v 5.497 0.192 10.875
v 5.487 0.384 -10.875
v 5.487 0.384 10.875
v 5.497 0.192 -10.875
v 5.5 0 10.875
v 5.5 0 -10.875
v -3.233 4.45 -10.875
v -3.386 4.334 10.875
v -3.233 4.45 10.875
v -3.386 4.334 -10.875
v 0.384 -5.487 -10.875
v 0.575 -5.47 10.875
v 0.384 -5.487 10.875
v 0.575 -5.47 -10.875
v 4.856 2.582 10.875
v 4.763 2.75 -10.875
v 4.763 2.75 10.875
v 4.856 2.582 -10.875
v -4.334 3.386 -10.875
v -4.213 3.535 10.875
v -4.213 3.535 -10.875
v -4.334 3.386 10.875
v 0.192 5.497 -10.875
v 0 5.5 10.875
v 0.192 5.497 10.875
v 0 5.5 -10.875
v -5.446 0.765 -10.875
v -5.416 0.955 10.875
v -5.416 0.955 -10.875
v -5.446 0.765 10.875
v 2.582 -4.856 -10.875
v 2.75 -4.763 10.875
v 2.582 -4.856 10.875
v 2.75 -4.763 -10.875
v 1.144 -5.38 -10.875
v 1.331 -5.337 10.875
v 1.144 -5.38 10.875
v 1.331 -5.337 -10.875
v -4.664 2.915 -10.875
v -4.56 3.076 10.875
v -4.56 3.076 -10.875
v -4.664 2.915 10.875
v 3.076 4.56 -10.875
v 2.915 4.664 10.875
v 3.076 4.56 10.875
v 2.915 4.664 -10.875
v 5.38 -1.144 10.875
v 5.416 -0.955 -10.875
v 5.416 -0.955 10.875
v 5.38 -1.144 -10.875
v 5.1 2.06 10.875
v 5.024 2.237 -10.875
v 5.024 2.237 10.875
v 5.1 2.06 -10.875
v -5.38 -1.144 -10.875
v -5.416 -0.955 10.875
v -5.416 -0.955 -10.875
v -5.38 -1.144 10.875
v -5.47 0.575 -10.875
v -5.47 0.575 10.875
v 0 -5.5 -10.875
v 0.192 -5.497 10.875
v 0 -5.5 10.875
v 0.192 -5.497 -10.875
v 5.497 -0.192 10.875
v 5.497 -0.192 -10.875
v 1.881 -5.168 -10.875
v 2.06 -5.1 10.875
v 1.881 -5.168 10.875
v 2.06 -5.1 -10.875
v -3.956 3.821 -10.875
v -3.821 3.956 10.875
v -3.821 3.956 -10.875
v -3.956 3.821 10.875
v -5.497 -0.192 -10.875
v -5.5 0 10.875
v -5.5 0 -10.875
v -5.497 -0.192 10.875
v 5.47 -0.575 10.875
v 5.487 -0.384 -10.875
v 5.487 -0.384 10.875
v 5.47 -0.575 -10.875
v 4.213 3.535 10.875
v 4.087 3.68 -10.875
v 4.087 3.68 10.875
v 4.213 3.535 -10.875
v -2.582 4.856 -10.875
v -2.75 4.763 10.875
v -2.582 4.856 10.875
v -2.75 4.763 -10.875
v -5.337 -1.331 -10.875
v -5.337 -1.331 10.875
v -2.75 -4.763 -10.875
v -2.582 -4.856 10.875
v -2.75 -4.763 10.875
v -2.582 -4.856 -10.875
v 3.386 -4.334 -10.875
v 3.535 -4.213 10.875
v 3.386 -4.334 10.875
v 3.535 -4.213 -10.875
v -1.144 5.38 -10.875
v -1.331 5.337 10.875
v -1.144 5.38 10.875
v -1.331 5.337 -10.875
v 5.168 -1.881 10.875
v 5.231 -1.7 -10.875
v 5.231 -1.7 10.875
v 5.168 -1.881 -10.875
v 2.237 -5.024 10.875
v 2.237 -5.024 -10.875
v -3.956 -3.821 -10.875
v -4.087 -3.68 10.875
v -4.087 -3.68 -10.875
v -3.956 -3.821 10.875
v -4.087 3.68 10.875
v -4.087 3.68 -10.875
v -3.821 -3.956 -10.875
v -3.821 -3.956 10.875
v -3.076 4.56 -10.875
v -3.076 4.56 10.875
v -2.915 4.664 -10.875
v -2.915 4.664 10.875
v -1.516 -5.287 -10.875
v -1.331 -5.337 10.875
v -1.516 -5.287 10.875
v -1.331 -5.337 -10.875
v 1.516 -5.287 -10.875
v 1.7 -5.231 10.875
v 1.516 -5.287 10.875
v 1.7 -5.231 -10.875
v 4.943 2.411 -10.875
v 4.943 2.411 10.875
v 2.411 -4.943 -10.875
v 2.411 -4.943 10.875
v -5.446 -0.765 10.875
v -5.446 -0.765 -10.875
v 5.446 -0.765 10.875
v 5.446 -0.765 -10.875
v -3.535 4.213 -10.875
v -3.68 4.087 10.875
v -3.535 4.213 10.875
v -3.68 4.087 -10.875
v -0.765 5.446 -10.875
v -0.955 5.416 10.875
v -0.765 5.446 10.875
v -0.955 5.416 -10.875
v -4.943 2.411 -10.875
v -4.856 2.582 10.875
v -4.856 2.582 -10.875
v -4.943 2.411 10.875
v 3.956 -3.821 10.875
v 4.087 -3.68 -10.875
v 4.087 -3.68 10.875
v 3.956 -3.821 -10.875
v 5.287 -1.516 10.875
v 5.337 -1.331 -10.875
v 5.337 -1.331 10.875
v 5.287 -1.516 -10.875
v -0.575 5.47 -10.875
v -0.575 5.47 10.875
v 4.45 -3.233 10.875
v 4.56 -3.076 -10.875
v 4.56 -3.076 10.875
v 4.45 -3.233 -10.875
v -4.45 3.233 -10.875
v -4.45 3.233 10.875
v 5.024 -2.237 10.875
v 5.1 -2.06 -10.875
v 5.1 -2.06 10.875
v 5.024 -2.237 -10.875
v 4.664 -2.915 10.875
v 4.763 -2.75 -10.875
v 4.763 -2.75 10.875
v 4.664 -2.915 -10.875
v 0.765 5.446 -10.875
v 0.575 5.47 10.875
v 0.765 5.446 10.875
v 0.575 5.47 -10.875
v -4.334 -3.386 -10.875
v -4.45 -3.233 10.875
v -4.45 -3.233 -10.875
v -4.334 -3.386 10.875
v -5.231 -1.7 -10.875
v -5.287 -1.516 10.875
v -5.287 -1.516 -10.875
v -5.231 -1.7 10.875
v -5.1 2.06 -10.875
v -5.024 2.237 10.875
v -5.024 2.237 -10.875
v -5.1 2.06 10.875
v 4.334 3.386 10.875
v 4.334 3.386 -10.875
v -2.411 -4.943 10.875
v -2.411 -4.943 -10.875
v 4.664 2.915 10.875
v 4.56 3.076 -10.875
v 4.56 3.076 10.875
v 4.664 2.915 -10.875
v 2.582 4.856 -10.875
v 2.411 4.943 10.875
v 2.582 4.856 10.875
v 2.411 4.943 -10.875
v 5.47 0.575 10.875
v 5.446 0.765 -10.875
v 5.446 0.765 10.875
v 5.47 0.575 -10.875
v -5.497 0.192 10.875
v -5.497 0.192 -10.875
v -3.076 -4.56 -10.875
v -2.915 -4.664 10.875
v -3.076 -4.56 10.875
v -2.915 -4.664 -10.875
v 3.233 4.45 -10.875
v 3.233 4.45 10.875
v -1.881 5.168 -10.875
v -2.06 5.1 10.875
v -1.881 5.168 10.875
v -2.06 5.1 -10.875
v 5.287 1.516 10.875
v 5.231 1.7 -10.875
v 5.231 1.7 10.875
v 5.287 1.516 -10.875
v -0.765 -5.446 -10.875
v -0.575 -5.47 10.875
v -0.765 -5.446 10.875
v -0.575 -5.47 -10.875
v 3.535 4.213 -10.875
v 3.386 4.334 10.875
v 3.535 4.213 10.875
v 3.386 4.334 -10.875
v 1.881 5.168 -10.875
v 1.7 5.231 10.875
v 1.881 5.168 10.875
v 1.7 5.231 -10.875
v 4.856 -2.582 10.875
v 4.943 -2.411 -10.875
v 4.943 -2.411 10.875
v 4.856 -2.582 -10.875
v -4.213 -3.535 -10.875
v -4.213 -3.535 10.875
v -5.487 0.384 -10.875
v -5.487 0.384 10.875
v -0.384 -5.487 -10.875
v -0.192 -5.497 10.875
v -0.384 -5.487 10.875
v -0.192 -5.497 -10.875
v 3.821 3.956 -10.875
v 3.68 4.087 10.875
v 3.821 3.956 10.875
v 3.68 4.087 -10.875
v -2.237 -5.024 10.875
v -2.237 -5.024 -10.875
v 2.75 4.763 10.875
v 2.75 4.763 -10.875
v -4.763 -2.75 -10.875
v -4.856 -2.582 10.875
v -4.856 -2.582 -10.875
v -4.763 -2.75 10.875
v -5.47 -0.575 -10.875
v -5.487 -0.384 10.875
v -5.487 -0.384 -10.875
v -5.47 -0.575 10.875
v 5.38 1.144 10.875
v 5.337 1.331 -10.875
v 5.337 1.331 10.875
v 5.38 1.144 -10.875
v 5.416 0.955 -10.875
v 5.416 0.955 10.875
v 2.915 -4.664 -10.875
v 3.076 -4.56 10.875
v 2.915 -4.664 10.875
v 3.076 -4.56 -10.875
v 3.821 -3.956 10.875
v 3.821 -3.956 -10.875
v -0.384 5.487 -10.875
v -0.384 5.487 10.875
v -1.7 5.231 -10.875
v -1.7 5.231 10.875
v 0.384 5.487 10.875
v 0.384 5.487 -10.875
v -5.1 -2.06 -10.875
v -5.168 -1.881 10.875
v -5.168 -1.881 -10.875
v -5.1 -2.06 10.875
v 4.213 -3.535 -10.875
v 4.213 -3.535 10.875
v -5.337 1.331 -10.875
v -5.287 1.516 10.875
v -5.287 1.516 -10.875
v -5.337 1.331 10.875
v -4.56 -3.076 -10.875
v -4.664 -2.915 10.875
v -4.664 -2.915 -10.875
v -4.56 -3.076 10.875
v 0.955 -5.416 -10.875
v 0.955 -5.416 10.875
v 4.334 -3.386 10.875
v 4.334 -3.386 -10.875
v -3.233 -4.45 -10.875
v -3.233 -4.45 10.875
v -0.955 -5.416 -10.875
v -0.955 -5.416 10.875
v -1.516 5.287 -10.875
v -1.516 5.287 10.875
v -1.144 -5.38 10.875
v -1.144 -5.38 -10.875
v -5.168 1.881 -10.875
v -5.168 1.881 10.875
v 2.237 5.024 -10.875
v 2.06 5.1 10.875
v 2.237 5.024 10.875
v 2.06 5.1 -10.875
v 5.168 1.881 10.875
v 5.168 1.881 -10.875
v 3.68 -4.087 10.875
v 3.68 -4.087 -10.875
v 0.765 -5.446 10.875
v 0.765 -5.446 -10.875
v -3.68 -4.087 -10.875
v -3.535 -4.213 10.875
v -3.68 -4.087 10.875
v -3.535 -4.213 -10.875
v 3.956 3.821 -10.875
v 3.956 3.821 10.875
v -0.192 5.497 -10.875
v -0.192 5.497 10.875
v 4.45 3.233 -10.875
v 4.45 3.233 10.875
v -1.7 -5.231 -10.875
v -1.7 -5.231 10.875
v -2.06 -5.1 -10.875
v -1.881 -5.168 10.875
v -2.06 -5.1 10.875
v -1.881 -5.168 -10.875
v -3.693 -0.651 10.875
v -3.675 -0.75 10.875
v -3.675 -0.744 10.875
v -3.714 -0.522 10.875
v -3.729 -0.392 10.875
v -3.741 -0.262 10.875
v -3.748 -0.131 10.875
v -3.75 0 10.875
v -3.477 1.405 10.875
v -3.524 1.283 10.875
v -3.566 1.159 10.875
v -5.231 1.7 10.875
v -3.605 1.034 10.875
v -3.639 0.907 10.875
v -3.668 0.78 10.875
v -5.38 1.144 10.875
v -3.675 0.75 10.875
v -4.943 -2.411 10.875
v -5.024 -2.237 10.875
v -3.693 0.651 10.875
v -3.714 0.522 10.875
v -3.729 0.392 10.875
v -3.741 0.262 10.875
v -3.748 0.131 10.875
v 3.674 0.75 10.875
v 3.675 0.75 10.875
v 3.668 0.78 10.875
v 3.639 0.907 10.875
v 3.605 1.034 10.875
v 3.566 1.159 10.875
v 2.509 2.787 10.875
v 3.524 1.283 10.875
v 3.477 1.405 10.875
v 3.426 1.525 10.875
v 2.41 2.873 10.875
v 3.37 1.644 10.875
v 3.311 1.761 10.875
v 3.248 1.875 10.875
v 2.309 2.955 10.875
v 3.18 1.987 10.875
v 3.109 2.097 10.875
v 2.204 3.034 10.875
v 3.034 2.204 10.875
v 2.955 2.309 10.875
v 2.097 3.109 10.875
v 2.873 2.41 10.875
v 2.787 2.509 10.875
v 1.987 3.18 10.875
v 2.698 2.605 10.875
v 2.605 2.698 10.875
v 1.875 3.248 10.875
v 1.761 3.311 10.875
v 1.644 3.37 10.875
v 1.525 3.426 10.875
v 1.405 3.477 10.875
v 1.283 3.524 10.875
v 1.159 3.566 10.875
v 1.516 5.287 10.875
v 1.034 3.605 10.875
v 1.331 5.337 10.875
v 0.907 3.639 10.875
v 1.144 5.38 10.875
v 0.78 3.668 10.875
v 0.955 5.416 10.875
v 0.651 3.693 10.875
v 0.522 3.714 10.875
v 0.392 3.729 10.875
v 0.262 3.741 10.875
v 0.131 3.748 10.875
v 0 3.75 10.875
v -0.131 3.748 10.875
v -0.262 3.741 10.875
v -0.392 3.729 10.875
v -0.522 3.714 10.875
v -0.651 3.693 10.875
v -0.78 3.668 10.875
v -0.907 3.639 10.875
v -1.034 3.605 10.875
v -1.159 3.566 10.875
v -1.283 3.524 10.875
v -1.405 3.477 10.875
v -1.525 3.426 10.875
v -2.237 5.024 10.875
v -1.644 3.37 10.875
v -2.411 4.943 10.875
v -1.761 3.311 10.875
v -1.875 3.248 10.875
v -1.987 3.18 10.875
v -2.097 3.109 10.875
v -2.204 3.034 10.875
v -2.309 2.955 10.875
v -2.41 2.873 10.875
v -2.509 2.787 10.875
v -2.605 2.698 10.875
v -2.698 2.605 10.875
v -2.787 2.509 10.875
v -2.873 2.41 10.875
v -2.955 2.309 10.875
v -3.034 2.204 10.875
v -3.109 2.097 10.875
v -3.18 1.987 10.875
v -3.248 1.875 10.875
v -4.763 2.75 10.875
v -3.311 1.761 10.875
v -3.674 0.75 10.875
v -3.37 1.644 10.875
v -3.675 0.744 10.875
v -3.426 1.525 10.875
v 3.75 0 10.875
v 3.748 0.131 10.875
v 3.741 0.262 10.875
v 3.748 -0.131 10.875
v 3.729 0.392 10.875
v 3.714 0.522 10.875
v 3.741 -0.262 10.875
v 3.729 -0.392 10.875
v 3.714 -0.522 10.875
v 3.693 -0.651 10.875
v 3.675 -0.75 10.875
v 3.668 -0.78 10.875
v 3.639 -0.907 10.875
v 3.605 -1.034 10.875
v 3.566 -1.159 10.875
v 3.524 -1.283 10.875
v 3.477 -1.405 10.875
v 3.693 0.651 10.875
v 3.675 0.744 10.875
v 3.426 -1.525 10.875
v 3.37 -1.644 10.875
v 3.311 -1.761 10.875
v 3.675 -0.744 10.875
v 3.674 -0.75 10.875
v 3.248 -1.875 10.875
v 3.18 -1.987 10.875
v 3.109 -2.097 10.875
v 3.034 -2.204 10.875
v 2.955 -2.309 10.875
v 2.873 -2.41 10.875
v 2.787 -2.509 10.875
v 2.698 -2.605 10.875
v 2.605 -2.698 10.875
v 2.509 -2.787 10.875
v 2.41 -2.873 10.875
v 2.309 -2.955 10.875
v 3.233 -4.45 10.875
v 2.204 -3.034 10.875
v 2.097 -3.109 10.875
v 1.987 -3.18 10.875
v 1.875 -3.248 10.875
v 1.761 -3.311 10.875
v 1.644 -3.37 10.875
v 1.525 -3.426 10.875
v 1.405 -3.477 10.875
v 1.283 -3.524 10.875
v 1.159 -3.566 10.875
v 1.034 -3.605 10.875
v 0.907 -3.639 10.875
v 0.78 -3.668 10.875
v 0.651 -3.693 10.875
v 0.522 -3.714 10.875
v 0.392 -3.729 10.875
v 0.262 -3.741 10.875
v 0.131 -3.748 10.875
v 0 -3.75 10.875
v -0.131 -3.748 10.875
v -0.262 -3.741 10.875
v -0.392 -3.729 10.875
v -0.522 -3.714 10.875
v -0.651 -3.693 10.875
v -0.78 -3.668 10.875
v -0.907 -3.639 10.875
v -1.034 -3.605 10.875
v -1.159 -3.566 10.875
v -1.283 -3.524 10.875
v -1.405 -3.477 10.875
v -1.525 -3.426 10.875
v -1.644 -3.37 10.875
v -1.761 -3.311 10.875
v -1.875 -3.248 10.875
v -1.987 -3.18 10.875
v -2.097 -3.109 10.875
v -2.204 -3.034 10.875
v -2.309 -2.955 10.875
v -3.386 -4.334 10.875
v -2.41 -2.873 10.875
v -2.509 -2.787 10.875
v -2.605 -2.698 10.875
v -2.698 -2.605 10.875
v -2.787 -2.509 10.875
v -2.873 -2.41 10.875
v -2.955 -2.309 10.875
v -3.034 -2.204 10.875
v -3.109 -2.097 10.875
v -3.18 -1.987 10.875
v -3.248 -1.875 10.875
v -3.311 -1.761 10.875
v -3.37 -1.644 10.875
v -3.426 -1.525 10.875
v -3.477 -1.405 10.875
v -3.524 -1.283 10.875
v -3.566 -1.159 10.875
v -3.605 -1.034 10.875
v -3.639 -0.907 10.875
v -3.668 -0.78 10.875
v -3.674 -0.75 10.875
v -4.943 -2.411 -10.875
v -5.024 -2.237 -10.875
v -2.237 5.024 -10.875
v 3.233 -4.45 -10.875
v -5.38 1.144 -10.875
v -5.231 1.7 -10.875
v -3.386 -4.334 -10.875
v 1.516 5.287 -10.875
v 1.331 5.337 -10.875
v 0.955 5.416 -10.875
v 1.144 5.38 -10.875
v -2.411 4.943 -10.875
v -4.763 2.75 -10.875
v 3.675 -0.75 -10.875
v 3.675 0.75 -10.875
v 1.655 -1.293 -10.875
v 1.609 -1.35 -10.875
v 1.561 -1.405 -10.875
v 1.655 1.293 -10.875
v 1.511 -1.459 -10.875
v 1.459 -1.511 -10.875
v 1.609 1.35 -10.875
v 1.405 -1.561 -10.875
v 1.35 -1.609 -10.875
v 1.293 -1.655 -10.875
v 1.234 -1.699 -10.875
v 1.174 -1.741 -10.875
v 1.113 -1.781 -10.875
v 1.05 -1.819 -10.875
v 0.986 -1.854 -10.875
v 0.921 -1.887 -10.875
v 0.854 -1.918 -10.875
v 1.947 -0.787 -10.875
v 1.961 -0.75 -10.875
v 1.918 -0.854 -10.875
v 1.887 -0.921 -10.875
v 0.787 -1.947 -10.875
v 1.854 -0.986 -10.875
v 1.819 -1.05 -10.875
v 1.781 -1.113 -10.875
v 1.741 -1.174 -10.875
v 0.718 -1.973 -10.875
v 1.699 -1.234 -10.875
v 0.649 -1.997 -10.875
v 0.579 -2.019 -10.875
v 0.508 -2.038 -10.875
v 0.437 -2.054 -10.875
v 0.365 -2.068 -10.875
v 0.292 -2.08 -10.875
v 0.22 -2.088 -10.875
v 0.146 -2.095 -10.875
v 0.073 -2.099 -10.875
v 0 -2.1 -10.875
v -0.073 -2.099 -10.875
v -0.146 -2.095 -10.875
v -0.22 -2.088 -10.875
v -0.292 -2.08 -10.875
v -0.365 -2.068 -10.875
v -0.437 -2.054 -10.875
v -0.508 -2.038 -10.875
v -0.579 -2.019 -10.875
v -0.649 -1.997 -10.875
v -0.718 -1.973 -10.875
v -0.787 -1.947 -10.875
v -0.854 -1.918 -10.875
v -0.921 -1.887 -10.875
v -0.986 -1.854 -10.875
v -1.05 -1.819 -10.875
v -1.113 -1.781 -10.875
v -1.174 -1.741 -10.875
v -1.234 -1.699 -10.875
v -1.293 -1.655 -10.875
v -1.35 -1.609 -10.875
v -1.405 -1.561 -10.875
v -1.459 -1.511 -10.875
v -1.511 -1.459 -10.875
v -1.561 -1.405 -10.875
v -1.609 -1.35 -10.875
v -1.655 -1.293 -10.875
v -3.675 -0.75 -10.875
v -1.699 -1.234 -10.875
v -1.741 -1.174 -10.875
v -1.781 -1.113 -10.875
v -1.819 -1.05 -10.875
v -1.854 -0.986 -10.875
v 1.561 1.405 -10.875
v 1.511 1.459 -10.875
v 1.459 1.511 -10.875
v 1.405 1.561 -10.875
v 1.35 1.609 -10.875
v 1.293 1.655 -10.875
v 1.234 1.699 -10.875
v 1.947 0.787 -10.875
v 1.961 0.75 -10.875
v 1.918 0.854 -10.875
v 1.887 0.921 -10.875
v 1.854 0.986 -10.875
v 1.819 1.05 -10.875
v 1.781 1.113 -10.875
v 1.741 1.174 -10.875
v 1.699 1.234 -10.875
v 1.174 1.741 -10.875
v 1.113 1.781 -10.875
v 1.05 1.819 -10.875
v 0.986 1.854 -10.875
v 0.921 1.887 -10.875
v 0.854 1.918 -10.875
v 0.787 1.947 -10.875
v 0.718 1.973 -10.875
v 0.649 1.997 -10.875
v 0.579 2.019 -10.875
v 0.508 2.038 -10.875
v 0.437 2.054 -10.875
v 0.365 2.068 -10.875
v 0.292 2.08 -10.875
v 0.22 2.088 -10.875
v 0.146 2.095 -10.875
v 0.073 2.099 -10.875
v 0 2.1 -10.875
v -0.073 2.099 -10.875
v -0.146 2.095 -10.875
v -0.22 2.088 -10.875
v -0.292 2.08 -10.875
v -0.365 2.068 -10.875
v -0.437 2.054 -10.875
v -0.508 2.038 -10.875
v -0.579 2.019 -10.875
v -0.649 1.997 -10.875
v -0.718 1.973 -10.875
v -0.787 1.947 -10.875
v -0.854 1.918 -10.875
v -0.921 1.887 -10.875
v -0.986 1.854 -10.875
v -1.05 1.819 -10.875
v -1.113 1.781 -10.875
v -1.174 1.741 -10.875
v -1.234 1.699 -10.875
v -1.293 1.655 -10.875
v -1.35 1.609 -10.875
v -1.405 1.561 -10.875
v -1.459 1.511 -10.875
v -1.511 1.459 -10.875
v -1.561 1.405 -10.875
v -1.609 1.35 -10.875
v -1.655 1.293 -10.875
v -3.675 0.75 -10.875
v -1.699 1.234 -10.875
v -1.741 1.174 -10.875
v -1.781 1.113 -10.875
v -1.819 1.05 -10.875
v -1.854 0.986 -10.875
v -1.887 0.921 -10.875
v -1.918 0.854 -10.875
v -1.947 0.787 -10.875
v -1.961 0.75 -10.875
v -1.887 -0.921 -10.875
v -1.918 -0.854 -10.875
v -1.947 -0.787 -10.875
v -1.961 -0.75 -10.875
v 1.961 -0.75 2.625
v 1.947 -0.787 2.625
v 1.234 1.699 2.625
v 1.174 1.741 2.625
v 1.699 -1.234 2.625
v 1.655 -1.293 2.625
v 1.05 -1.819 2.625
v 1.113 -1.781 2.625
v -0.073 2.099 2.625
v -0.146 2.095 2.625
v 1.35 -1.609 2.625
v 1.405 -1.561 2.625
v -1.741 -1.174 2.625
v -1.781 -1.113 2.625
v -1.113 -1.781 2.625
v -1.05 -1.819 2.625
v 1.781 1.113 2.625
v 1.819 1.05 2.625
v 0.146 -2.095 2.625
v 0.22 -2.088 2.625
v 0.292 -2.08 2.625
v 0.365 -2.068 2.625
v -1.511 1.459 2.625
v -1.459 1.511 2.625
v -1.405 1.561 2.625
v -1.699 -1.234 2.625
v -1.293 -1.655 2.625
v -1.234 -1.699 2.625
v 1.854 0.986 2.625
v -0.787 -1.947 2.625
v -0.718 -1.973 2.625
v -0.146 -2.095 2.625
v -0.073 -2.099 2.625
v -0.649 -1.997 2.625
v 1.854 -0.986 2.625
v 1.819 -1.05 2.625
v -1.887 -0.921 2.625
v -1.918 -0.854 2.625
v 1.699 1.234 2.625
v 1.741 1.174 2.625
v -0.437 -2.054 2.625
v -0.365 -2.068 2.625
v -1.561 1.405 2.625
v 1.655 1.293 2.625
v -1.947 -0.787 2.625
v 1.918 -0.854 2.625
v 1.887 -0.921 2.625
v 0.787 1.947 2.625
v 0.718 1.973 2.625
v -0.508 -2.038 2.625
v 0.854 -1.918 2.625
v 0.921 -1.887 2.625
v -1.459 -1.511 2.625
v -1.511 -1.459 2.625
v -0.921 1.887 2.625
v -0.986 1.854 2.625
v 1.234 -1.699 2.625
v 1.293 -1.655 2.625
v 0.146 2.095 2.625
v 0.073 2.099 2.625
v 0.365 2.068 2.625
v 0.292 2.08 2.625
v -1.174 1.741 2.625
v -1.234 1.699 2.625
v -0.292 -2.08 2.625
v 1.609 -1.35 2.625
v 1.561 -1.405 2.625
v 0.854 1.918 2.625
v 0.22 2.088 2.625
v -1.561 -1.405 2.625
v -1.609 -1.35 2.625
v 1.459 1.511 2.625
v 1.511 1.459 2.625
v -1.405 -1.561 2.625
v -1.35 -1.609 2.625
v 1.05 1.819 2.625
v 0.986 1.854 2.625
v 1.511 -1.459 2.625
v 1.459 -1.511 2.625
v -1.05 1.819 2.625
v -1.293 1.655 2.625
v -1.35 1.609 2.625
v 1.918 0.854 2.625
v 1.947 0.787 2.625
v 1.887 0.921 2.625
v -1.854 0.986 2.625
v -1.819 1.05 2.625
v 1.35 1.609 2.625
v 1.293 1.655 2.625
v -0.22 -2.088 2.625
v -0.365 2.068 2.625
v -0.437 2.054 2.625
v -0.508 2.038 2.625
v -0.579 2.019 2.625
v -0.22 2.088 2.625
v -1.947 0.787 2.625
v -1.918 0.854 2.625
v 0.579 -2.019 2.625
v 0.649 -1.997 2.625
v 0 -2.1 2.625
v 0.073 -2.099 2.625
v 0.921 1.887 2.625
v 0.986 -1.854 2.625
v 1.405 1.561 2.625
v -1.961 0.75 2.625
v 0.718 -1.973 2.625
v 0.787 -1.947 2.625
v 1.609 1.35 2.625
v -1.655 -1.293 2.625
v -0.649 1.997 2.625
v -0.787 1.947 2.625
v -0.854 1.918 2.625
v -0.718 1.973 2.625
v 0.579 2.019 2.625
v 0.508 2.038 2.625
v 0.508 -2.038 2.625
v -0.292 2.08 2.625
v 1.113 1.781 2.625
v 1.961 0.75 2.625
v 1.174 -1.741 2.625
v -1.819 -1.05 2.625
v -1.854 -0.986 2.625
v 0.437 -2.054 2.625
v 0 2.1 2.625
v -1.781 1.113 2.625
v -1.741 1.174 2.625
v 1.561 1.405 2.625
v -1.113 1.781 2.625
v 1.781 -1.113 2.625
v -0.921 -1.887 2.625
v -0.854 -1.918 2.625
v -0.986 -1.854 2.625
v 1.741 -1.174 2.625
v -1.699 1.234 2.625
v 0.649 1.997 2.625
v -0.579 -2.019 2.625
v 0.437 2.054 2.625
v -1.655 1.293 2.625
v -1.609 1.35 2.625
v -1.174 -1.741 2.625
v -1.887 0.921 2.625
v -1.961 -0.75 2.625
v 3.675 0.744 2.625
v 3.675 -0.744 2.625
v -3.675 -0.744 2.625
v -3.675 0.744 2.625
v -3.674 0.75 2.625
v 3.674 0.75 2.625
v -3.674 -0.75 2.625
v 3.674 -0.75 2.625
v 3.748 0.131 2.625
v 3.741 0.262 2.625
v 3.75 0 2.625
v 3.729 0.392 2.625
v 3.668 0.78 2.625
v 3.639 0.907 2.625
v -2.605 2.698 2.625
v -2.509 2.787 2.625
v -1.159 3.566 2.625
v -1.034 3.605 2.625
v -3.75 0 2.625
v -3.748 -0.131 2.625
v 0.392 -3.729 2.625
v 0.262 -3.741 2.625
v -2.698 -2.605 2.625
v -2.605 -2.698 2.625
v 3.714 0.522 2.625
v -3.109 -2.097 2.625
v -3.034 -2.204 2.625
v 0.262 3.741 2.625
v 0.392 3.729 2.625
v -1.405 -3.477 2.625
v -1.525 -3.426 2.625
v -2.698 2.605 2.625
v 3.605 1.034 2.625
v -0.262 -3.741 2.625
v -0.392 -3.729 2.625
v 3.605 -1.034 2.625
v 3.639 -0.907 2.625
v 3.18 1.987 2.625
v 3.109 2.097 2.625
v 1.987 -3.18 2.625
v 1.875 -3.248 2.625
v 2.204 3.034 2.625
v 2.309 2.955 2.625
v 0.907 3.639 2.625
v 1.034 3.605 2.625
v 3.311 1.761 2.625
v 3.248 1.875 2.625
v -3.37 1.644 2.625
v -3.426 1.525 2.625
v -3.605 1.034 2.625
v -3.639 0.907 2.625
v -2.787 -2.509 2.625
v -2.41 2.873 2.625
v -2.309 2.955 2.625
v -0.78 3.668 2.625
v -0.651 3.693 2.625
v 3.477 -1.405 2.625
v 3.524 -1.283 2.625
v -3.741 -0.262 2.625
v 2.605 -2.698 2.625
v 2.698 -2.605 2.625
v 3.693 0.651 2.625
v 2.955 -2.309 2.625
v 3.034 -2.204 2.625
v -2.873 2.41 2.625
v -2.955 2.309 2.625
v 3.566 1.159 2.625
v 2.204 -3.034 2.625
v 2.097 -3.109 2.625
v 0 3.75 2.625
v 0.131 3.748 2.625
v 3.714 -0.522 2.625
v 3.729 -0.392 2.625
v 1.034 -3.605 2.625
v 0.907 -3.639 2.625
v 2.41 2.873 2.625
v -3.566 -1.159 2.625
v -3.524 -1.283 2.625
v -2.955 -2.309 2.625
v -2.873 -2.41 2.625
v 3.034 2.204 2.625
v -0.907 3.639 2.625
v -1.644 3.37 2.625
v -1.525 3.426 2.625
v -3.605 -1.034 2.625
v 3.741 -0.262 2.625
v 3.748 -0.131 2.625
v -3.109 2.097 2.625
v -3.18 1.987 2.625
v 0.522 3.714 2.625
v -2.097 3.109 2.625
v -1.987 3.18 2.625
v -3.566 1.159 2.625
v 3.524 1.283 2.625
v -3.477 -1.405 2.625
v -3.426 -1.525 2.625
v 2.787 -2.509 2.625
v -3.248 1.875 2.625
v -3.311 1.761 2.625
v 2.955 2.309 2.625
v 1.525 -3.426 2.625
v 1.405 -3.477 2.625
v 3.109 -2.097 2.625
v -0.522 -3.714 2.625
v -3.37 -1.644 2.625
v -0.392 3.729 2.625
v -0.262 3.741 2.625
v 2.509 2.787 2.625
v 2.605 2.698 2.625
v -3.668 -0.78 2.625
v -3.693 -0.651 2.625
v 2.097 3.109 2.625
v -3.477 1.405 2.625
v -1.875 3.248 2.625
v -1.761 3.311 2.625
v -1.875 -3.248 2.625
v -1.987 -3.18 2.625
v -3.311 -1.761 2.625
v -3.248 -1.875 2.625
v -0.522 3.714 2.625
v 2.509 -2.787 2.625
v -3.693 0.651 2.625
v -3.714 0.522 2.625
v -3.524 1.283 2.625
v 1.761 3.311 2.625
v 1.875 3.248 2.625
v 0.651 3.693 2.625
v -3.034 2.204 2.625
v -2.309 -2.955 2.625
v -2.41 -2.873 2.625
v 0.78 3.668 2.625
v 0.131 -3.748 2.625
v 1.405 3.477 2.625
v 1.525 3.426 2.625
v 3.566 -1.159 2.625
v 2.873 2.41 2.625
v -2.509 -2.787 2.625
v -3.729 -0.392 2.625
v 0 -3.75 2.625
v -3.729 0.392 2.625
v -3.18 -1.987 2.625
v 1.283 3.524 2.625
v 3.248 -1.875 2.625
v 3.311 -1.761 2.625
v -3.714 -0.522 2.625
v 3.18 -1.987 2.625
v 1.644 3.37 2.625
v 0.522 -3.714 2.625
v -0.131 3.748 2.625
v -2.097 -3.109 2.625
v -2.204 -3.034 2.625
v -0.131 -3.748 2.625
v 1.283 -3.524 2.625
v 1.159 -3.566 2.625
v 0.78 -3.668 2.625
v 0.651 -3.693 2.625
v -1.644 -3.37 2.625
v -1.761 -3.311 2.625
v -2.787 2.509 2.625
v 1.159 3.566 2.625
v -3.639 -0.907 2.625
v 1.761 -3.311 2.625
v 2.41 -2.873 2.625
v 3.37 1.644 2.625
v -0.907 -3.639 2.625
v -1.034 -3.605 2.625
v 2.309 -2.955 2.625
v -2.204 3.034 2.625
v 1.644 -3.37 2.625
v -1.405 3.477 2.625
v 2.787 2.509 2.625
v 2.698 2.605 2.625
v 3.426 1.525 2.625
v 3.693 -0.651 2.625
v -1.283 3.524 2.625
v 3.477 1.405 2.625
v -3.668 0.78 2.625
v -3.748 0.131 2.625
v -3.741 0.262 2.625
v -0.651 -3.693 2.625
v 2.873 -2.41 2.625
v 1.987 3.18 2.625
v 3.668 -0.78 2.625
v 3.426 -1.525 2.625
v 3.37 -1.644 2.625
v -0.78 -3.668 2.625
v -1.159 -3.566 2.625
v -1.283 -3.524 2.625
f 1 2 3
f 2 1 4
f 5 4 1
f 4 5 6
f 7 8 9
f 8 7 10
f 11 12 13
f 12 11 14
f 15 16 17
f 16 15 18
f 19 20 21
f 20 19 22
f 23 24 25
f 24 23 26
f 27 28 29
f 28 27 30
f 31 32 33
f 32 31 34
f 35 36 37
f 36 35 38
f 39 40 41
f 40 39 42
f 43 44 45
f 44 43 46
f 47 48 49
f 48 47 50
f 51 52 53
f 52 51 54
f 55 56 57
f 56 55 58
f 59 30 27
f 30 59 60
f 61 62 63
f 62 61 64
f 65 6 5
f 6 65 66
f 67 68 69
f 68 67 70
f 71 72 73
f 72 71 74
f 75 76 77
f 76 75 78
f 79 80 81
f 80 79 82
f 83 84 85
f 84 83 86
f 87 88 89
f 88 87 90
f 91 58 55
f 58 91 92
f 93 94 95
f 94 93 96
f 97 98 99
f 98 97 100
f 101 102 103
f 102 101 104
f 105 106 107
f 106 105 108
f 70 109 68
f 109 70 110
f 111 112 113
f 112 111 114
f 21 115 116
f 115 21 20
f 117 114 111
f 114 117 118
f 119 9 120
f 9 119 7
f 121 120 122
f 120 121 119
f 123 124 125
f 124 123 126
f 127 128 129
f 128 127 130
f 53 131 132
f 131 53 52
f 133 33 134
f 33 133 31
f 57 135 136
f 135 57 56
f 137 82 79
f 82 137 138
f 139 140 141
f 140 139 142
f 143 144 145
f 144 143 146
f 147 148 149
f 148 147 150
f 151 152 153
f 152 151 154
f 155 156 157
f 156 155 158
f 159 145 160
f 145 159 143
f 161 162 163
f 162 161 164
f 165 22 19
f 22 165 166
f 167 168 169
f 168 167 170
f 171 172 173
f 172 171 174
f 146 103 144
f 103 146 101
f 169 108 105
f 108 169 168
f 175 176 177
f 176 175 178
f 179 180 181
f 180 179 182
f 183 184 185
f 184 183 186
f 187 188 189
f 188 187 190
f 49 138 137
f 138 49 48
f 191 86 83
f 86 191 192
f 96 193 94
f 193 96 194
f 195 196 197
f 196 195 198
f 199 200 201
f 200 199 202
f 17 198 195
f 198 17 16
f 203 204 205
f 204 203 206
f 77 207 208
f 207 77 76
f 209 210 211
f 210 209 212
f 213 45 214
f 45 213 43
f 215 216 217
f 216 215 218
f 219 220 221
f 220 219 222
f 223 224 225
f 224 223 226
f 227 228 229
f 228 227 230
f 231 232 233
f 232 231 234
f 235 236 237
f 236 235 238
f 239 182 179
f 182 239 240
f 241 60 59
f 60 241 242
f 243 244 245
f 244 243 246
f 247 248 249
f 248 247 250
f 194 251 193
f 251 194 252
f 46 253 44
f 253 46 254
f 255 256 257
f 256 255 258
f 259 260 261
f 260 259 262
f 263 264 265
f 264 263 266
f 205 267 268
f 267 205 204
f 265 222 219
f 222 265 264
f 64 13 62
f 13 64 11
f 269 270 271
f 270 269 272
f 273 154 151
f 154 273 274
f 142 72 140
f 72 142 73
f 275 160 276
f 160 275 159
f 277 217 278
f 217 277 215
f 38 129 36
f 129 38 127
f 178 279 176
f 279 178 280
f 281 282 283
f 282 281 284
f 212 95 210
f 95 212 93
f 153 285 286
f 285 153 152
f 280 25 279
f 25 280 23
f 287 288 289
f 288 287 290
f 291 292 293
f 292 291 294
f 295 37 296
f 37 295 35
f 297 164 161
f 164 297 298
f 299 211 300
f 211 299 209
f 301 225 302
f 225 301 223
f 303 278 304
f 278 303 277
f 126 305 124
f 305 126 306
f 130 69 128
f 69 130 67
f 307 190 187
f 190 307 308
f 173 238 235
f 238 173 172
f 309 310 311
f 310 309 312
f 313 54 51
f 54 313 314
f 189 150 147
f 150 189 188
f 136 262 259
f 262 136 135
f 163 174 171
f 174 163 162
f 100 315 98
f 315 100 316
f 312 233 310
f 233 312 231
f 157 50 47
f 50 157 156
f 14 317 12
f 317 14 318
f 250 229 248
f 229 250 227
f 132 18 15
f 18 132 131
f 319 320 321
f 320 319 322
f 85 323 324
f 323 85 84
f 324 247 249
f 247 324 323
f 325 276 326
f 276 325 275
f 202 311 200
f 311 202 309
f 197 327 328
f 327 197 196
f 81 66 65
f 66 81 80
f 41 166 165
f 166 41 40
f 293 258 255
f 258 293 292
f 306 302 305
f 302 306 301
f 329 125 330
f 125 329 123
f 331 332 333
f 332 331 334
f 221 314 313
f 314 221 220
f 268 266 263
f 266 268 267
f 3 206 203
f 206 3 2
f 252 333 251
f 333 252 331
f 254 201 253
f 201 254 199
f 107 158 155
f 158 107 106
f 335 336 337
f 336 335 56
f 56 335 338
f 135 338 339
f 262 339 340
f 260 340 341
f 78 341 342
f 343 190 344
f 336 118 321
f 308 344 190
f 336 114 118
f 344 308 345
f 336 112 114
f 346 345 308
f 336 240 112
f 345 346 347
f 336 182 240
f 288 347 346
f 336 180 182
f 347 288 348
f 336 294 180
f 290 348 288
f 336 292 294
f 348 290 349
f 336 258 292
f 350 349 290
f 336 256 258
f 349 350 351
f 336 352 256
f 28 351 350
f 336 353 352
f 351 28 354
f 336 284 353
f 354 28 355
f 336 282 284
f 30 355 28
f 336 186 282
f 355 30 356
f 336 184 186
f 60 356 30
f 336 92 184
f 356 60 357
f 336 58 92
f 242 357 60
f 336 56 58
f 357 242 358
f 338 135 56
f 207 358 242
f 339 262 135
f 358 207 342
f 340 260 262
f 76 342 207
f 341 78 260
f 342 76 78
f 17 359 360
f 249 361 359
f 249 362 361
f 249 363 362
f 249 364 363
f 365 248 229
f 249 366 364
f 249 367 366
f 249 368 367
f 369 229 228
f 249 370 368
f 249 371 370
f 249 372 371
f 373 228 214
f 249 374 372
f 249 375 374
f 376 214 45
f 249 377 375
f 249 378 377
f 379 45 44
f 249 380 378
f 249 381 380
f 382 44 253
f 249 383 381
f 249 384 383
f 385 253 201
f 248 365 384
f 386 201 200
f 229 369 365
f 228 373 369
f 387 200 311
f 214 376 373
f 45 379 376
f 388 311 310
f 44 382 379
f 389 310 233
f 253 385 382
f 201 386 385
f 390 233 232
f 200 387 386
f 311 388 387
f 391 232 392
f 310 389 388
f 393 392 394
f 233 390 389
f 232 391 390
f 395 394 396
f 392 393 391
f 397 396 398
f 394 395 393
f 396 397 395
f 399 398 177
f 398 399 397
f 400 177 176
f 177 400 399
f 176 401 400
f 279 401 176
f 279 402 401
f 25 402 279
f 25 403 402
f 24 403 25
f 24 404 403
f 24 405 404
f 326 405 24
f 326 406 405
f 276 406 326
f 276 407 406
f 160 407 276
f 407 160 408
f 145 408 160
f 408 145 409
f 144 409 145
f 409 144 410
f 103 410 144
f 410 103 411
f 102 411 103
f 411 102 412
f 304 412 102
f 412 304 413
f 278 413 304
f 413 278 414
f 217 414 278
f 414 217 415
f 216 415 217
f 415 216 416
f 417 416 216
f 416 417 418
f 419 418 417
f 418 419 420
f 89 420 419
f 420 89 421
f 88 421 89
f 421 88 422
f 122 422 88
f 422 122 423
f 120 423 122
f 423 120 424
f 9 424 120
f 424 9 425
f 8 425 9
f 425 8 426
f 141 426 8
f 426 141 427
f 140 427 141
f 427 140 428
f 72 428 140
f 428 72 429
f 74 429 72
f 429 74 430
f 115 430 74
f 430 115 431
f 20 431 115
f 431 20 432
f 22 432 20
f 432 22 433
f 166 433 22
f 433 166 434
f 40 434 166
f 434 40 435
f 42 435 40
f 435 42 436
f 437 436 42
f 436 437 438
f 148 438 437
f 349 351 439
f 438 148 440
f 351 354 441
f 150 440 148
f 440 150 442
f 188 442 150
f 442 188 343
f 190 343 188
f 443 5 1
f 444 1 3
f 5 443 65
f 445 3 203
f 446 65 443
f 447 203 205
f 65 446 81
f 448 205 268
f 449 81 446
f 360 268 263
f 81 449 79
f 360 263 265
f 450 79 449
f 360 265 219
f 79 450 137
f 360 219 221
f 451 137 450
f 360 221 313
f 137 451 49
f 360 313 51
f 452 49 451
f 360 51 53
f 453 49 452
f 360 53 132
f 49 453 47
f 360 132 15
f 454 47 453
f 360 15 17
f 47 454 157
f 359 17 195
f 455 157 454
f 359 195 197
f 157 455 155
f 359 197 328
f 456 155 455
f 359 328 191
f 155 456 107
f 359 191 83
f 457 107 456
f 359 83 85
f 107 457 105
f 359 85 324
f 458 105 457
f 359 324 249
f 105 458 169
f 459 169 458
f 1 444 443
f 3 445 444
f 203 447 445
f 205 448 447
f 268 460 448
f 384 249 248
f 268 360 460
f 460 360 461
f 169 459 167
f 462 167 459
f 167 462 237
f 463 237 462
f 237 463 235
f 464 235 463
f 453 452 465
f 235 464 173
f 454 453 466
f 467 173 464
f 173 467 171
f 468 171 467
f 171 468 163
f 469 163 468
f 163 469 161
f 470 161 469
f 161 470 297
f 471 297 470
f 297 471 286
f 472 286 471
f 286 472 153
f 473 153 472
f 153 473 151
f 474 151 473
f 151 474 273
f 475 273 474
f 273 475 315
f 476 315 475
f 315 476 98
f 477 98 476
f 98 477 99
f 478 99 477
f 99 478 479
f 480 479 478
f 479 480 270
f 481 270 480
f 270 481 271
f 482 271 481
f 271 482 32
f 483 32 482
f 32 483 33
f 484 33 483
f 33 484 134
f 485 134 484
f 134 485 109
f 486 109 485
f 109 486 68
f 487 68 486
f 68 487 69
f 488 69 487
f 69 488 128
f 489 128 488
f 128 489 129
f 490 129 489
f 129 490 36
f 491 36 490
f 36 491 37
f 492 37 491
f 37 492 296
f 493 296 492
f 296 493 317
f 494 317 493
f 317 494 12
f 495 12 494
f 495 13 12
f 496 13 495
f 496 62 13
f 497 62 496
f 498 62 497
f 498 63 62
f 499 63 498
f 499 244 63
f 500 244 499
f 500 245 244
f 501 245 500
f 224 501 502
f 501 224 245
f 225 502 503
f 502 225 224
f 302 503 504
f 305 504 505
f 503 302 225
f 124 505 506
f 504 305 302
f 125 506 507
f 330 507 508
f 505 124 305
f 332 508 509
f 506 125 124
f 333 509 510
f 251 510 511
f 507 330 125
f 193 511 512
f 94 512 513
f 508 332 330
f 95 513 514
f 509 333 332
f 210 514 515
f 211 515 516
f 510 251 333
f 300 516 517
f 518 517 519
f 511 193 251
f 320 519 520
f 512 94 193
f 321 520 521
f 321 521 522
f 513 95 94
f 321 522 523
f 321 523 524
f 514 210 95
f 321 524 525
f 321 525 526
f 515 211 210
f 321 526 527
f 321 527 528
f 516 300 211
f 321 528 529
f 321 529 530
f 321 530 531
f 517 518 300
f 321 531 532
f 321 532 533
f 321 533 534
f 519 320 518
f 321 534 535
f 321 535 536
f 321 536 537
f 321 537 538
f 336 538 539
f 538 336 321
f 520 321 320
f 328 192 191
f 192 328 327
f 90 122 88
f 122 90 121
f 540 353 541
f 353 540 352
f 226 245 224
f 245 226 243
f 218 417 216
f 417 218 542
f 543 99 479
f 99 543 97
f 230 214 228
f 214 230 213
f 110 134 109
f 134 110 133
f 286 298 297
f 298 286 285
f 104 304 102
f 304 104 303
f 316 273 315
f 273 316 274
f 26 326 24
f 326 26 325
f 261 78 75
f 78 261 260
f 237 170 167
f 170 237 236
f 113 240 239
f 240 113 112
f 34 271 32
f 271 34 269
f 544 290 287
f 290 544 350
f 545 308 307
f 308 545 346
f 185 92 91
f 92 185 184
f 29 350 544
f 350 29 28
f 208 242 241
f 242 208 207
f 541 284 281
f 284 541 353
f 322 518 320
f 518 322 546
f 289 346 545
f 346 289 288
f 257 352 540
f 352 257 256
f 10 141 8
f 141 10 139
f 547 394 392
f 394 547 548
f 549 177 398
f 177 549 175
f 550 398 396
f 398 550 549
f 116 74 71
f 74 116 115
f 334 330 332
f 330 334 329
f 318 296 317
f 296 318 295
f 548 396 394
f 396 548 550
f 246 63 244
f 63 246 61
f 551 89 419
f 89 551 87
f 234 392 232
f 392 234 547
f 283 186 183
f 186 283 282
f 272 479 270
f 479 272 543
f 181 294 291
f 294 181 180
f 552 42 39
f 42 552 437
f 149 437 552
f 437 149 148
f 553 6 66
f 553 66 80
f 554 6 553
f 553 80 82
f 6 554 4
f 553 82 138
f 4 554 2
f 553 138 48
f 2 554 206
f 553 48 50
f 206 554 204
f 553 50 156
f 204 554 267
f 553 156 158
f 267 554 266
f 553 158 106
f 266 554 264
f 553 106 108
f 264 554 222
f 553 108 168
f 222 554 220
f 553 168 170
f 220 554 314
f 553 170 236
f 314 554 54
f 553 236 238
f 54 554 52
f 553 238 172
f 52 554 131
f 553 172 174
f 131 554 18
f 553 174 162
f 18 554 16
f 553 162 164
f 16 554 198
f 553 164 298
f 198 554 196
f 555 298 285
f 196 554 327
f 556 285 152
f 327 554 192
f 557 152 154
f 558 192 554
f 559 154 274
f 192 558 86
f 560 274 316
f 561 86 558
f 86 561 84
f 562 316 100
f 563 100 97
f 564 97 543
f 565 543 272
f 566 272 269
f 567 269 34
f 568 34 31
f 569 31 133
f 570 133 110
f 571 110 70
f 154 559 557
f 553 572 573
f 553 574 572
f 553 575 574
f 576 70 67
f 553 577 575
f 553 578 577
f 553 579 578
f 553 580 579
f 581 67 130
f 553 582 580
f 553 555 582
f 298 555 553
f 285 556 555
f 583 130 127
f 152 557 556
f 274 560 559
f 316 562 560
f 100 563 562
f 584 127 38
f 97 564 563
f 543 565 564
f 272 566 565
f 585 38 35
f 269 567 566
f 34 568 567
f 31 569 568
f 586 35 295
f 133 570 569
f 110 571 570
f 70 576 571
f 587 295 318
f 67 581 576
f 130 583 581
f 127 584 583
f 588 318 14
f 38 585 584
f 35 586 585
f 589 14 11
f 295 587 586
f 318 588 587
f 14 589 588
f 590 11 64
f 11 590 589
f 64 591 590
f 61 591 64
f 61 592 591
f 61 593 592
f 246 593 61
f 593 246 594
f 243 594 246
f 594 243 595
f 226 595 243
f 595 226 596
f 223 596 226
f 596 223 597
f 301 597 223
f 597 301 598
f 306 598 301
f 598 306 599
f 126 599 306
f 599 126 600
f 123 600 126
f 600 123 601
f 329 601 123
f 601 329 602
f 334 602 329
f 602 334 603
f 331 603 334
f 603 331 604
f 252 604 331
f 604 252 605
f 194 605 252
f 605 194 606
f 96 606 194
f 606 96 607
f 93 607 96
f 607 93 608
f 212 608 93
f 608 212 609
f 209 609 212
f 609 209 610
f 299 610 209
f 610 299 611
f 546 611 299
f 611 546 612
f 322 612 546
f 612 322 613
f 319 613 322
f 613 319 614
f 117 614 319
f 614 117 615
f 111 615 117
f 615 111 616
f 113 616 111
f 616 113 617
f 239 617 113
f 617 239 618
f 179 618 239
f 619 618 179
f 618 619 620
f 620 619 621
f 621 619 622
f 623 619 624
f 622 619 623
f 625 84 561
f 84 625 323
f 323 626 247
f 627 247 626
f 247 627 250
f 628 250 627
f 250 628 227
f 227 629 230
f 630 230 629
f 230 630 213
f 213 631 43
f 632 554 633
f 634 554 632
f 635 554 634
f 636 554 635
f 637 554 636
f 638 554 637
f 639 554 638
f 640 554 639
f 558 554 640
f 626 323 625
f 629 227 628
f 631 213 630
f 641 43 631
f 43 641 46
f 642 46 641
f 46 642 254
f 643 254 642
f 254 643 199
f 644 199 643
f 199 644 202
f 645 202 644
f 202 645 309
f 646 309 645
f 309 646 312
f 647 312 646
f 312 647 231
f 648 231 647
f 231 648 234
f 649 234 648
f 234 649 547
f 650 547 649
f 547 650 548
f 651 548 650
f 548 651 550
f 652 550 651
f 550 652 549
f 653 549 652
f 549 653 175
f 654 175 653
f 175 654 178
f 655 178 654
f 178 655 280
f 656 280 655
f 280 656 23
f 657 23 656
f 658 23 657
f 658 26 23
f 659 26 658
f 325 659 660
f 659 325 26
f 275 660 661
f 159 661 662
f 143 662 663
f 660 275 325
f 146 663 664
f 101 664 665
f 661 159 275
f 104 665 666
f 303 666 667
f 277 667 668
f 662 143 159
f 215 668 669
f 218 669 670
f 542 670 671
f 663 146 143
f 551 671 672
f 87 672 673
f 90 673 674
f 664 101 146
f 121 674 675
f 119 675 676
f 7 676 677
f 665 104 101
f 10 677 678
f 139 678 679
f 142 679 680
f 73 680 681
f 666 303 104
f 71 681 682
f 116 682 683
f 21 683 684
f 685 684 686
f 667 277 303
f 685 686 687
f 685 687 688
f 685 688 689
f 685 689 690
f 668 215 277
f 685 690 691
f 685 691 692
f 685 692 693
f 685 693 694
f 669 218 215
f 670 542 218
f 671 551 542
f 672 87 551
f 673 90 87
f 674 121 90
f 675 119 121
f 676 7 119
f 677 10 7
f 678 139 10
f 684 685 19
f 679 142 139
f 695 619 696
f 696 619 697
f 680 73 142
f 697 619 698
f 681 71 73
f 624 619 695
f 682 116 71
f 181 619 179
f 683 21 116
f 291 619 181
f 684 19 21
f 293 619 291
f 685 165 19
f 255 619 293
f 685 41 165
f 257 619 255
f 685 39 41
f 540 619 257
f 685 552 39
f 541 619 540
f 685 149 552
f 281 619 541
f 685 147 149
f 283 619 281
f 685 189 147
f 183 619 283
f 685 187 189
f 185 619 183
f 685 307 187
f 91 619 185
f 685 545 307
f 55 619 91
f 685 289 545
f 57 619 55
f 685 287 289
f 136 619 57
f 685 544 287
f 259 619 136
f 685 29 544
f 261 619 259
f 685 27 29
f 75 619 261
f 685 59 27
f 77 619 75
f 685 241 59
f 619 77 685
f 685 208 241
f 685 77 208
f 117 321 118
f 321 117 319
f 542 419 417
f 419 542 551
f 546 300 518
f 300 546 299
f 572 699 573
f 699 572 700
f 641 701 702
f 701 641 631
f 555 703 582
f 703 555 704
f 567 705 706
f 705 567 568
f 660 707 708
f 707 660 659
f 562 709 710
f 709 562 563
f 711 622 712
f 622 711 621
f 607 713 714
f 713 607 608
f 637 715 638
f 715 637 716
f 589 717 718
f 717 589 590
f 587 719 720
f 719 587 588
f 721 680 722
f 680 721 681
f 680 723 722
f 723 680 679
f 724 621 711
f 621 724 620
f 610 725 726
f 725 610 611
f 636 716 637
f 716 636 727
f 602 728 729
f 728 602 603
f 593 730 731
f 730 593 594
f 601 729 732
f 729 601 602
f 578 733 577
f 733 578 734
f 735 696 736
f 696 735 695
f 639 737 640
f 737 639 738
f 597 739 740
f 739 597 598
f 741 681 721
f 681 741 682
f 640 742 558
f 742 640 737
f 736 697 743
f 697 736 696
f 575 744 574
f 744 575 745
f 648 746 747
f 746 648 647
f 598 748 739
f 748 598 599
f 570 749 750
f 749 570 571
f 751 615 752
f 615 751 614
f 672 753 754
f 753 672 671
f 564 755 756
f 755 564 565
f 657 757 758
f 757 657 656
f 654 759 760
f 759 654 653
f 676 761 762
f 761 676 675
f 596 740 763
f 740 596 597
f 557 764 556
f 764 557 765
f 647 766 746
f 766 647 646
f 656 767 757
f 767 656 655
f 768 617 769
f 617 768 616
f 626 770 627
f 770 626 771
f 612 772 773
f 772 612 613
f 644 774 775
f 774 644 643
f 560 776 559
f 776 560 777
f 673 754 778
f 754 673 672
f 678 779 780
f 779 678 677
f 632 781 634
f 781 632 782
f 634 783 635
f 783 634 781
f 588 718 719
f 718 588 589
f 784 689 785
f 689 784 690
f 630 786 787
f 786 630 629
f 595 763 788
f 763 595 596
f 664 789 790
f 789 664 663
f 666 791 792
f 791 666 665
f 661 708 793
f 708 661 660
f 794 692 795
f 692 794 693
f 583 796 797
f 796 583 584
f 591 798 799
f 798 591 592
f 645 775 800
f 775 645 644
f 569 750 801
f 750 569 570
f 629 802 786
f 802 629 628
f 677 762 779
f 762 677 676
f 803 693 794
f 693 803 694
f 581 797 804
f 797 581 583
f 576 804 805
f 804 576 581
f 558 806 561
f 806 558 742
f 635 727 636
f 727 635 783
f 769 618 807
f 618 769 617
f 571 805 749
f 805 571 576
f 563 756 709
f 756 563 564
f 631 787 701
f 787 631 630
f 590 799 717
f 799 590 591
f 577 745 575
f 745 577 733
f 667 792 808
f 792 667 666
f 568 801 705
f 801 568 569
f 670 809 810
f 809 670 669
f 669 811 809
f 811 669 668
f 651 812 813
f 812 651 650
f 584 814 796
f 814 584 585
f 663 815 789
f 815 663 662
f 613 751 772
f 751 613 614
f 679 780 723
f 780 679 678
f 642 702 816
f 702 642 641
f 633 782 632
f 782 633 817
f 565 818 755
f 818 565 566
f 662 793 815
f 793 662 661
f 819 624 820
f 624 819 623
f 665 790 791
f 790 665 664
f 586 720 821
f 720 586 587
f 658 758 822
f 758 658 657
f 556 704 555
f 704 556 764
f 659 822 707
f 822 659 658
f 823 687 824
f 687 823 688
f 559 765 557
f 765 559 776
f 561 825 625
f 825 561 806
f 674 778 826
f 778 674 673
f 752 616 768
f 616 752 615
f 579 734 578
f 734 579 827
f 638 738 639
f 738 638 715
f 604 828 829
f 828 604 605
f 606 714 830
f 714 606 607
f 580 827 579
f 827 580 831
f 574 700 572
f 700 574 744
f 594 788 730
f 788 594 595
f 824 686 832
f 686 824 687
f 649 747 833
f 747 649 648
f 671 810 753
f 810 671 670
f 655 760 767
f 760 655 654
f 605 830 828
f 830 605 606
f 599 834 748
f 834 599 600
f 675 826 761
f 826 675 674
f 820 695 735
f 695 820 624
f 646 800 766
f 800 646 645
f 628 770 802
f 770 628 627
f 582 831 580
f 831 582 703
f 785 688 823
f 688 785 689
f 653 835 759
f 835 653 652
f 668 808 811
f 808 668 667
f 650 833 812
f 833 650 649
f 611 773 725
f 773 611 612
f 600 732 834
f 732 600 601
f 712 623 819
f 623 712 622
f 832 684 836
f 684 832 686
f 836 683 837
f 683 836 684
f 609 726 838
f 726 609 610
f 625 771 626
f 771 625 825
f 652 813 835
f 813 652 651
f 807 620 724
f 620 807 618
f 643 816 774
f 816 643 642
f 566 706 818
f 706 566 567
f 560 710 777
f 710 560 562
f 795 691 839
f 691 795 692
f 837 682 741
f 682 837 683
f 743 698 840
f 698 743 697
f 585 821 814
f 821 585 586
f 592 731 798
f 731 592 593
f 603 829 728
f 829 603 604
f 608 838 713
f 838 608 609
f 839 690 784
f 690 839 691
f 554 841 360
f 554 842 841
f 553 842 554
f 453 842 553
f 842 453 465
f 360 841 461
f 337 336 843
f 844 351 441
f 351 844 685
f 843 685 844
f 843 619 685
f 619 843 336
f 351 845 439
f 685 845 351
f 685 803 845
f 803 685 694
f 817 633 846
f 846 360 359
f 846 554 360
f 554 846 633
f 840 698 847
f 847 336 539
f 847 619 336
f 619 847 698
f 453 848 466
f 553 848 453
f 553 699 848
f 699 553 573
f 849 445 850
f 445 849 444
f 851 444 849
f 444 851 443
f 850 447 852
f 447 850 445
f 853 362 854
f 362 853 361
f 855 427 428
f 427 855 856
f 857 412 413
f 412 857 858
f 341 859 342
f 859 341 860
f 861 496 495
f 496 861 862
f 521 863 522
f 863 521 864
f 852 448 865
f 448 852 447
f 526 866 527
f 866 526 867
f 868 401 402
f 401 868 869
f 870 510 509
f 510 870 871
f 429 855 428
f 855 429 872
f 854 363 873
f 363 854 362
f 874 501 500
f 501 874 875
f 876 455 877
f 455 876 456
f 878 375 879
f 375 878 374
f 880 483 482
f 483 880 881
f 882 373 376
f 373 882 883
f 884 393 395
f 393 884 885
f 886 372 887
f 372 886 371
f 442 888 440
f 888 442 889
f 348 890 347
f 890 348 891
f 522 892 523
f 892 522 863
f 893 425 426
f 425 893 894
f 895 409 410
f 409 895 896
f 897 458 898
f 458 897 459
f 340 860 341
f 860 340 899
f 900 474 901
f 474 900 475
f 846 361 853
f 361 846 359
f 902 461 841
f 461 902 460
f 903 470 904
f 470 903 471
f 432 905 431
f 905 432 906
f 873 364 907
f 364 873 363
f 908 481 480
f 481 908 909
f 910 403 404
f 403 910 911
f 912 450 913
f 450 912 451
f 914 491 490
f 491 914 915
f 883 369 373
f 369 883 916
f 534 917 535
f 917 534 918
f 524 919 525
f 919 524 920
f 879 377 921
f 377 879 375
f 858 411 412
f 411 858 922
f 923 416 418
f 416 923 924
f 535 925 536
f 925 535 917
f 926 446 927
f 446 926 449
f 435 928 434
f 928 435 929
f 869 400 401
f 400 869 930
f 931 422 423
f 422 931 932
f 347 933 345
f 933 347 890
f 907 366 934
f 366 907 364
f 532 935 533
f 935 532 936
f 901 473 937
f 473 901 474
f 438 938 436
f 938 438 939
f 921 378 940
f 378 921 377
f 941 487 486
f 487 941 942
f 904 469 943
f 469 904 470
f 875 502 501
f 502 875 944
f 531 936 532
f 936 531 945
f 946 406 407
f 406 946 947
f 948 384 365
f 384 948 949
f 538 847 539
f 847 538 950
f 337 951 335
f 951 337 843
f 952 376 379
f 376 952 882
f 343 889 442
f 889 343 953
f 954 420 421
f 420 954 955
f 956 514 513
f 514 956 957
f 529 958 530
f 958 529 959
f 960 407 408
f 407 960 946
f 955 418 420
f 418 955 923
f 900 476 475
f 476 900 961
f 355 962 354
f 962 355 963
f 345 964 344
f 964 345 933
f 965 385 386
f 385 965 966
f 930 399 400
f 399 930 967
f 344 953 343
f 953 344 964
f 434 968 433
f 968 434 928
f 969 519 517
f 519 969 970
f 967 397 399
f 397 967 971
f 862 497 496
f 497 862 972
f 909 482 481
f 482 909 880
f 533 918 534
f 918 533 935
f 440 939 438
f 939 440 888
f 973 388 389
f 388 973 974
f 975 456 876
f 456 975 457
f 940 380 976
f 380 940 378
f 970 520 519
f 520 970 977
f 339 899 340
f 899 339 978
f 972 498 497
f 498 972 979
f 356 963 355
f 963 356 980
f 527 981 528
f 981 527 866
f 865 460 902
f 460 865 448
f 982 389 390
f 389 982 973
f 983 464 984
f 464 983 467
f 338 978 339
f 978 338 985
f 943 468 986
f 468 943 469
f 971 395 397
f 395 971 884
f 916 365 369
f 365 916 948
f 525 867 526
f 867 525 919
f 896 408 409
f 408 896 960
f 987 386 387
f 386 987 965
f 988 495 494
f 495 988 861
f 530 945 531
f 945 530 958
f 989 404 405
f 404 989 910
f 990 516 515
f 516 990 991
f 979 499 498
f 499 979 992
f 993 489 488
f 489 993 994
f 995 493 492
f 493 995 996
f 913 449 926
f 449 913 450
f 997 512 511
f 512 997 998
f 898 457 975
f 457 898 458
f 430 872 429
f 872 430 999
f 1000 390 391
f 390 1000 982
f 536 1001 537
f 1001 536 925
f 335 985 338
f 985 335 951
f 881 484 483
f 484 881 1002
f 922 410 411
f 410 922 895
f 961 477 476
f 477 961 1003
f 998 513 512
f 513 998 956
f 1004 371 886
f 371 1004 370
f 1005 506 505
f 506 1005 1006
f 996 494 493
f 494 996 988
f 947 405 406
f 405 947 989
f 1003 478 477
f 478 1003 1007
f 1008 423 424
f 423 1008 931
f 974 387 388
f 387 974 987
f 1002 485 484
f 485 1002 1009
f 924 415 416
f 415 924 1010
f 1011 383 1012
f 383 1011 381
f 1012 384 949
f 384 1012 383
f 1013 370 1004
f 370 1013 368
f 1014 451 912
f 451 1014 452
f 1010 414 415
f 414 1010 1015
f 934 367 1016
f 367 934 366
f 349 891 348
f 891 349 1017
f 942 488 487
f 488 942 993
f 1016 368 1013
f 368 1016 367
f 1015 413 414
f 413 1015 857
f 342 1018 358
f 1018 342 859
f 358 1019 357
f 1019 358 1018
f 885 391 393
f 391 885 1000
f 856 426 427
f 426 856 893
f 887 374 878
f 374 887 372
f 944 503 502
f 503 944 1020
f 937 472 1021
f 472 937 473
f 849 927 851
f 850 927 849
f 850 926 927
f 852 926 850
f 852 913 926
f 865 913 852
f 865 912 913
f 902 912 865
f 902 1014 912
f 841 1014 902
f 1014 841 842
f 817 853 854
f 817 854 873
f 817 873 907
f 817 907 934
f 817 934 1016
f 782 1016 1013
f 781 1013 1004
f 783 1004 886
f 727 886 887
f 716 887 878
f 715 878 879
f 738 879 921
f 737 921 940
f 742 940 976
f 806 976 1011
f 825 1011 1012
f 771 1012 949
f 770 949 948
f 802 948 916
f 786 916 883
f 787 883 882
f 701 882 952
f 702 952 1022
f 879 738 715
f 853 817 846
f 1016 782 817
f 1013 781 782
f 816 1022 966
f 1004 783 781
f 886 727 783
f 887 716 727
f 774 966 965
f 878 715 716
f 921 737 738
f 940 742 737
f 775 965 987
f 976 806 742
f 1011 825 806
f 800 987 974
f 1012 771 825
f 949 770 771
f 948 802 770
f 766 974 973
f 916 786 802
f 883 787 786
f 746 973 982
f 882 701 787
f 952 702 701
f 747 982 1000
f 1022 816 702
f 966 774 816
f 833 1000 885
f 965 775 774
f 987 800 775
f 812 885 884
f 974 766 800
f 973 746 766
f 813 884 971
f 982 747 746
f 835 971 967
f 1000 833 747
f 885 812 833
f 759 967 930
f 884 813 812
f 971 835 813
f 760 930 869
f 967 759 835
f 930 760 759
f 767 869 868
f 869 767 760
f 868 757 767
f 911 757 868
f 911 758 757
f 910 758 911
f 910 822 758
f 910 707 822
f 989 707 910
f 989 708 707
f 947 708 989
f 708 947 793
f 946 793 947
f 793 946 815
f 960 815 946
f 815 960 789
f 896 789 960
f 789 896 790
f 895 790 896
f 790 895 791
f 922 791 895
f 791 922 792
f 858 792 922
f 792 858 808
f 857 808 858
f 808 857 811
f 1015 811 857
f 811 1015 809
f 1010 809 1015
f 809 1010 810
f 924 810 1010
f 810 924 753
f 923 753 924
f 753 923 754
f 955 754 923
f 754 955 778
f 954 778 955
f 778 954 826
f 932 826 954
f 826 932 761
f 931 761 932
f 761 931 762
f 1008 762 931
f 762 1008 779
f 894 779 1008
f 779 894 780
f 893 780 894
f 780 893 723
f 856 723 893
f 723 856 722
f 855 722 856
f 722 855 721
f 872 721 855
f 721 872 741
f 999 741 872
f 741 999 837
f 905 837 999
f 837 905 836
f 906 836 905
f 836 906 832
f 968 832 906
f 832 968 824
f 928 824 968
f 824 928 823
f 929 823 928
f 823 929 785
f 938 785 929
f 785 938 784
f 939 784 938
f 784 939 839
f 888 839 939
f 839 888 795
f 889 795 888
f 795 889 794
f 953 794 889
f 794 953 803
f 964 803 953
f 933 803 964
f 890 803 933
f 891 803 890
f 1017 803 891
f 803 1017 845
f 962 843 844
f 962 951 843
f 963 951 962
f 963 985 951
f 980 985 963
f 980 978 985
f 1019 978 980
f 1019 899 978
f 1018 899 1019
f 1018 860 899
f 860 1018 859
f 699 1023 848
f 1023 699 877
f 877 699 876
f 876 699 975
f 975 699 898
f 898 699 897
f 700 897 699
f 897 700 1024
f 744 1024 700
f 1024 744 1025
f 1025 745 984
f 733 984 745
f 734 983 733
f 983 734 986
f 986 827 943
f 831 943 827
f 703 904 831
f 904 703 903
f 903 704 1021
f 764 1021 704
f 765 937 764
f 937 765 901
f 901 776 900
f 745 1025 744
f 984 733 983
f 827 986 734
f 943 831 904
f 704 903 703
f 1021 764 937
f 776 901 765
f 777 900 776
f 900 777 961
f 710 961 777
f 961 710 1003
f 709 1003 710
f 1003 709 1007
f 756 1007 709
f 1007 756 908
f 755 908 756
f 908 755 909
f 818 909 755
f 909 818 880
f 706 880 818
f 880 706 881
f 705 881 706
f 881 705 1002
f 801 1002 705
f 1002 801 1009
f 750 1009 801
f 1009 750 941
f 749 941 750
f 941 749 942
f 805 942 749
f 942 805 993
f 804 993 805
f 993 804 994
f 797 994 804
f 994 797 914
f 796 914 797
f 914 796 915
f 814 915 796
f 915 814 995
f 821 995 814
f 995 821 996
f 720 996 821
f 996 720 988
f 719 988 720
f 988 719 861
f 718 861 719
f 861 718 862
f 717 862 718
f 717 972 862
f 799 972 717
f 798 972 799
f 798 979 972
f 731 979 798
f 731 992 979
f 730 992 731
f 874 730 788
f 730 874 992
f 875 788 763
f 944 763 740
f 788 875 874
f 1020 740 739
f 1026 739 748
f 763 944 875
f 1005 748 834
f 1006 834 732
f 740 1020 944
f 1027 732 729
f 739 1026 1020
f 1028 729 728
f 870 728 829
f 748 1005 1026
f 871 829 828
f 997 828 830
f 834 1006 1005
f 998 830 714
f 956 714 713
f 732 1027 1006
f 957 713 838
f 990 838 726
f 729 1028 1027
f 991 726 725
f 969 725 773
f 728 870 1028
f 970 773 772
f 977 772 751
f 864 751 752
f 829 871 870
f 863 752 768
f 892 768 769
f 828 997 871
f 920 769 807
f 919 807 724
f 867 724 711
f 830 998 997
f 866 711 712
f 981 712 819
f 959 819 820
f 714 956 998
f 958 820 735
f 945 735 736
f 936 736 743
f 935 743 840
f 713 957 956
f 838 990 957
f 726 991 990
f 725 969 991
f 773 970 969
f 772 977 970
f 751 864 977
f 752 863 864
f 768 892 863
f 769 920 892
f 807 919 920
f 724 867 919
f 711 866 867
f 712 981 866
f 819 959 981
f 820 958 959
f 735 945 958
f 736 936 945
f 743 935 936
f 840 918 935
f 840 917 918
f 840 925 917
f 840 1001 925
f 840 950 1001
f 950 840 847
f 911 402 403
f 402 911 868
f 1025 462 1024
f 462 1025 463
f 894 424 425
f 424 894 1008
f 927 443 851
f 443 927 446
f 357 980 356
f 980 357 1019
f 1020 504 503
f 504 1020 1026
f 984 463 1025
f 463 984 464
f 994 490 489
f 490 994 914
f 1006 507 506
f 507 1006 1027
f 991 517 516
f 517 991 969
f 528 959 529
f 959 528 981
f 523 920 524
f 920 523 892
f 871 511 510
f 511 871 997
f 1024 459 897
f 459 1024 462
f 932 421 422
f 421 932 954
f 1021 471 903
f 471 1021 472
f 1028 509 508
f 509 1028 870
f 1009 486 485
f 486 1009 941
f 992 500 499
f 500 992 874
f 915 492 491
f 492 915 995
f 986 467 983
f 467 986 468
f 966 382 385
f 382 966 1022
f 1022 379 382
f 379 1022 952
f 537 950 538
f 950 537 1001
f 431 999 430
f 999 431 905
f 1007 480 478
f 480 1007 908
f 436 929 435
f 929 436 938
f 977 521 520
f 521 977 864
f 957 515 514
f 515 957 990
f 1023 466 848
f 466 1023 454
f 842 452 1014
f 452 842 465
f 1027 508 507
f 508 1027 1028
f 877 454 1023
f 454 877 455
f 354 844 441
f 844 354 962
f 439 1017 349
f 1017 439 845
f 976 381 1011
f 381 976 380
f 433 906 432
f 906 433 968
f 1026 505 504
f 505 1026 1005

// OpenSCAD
$fn = 180;

height = 21.75;
inner_width = 7.5;

difference() {
    cylinder(d=11, h=height, center=true);
    cylinder(d=4.2, h=2*height, center=true);
    cube([inner_width-0.15, 1.5, 2*height], center=true);
    translate([0, 0, 13.5])
        cylinder(d=inner_width, height, center=true);
}
